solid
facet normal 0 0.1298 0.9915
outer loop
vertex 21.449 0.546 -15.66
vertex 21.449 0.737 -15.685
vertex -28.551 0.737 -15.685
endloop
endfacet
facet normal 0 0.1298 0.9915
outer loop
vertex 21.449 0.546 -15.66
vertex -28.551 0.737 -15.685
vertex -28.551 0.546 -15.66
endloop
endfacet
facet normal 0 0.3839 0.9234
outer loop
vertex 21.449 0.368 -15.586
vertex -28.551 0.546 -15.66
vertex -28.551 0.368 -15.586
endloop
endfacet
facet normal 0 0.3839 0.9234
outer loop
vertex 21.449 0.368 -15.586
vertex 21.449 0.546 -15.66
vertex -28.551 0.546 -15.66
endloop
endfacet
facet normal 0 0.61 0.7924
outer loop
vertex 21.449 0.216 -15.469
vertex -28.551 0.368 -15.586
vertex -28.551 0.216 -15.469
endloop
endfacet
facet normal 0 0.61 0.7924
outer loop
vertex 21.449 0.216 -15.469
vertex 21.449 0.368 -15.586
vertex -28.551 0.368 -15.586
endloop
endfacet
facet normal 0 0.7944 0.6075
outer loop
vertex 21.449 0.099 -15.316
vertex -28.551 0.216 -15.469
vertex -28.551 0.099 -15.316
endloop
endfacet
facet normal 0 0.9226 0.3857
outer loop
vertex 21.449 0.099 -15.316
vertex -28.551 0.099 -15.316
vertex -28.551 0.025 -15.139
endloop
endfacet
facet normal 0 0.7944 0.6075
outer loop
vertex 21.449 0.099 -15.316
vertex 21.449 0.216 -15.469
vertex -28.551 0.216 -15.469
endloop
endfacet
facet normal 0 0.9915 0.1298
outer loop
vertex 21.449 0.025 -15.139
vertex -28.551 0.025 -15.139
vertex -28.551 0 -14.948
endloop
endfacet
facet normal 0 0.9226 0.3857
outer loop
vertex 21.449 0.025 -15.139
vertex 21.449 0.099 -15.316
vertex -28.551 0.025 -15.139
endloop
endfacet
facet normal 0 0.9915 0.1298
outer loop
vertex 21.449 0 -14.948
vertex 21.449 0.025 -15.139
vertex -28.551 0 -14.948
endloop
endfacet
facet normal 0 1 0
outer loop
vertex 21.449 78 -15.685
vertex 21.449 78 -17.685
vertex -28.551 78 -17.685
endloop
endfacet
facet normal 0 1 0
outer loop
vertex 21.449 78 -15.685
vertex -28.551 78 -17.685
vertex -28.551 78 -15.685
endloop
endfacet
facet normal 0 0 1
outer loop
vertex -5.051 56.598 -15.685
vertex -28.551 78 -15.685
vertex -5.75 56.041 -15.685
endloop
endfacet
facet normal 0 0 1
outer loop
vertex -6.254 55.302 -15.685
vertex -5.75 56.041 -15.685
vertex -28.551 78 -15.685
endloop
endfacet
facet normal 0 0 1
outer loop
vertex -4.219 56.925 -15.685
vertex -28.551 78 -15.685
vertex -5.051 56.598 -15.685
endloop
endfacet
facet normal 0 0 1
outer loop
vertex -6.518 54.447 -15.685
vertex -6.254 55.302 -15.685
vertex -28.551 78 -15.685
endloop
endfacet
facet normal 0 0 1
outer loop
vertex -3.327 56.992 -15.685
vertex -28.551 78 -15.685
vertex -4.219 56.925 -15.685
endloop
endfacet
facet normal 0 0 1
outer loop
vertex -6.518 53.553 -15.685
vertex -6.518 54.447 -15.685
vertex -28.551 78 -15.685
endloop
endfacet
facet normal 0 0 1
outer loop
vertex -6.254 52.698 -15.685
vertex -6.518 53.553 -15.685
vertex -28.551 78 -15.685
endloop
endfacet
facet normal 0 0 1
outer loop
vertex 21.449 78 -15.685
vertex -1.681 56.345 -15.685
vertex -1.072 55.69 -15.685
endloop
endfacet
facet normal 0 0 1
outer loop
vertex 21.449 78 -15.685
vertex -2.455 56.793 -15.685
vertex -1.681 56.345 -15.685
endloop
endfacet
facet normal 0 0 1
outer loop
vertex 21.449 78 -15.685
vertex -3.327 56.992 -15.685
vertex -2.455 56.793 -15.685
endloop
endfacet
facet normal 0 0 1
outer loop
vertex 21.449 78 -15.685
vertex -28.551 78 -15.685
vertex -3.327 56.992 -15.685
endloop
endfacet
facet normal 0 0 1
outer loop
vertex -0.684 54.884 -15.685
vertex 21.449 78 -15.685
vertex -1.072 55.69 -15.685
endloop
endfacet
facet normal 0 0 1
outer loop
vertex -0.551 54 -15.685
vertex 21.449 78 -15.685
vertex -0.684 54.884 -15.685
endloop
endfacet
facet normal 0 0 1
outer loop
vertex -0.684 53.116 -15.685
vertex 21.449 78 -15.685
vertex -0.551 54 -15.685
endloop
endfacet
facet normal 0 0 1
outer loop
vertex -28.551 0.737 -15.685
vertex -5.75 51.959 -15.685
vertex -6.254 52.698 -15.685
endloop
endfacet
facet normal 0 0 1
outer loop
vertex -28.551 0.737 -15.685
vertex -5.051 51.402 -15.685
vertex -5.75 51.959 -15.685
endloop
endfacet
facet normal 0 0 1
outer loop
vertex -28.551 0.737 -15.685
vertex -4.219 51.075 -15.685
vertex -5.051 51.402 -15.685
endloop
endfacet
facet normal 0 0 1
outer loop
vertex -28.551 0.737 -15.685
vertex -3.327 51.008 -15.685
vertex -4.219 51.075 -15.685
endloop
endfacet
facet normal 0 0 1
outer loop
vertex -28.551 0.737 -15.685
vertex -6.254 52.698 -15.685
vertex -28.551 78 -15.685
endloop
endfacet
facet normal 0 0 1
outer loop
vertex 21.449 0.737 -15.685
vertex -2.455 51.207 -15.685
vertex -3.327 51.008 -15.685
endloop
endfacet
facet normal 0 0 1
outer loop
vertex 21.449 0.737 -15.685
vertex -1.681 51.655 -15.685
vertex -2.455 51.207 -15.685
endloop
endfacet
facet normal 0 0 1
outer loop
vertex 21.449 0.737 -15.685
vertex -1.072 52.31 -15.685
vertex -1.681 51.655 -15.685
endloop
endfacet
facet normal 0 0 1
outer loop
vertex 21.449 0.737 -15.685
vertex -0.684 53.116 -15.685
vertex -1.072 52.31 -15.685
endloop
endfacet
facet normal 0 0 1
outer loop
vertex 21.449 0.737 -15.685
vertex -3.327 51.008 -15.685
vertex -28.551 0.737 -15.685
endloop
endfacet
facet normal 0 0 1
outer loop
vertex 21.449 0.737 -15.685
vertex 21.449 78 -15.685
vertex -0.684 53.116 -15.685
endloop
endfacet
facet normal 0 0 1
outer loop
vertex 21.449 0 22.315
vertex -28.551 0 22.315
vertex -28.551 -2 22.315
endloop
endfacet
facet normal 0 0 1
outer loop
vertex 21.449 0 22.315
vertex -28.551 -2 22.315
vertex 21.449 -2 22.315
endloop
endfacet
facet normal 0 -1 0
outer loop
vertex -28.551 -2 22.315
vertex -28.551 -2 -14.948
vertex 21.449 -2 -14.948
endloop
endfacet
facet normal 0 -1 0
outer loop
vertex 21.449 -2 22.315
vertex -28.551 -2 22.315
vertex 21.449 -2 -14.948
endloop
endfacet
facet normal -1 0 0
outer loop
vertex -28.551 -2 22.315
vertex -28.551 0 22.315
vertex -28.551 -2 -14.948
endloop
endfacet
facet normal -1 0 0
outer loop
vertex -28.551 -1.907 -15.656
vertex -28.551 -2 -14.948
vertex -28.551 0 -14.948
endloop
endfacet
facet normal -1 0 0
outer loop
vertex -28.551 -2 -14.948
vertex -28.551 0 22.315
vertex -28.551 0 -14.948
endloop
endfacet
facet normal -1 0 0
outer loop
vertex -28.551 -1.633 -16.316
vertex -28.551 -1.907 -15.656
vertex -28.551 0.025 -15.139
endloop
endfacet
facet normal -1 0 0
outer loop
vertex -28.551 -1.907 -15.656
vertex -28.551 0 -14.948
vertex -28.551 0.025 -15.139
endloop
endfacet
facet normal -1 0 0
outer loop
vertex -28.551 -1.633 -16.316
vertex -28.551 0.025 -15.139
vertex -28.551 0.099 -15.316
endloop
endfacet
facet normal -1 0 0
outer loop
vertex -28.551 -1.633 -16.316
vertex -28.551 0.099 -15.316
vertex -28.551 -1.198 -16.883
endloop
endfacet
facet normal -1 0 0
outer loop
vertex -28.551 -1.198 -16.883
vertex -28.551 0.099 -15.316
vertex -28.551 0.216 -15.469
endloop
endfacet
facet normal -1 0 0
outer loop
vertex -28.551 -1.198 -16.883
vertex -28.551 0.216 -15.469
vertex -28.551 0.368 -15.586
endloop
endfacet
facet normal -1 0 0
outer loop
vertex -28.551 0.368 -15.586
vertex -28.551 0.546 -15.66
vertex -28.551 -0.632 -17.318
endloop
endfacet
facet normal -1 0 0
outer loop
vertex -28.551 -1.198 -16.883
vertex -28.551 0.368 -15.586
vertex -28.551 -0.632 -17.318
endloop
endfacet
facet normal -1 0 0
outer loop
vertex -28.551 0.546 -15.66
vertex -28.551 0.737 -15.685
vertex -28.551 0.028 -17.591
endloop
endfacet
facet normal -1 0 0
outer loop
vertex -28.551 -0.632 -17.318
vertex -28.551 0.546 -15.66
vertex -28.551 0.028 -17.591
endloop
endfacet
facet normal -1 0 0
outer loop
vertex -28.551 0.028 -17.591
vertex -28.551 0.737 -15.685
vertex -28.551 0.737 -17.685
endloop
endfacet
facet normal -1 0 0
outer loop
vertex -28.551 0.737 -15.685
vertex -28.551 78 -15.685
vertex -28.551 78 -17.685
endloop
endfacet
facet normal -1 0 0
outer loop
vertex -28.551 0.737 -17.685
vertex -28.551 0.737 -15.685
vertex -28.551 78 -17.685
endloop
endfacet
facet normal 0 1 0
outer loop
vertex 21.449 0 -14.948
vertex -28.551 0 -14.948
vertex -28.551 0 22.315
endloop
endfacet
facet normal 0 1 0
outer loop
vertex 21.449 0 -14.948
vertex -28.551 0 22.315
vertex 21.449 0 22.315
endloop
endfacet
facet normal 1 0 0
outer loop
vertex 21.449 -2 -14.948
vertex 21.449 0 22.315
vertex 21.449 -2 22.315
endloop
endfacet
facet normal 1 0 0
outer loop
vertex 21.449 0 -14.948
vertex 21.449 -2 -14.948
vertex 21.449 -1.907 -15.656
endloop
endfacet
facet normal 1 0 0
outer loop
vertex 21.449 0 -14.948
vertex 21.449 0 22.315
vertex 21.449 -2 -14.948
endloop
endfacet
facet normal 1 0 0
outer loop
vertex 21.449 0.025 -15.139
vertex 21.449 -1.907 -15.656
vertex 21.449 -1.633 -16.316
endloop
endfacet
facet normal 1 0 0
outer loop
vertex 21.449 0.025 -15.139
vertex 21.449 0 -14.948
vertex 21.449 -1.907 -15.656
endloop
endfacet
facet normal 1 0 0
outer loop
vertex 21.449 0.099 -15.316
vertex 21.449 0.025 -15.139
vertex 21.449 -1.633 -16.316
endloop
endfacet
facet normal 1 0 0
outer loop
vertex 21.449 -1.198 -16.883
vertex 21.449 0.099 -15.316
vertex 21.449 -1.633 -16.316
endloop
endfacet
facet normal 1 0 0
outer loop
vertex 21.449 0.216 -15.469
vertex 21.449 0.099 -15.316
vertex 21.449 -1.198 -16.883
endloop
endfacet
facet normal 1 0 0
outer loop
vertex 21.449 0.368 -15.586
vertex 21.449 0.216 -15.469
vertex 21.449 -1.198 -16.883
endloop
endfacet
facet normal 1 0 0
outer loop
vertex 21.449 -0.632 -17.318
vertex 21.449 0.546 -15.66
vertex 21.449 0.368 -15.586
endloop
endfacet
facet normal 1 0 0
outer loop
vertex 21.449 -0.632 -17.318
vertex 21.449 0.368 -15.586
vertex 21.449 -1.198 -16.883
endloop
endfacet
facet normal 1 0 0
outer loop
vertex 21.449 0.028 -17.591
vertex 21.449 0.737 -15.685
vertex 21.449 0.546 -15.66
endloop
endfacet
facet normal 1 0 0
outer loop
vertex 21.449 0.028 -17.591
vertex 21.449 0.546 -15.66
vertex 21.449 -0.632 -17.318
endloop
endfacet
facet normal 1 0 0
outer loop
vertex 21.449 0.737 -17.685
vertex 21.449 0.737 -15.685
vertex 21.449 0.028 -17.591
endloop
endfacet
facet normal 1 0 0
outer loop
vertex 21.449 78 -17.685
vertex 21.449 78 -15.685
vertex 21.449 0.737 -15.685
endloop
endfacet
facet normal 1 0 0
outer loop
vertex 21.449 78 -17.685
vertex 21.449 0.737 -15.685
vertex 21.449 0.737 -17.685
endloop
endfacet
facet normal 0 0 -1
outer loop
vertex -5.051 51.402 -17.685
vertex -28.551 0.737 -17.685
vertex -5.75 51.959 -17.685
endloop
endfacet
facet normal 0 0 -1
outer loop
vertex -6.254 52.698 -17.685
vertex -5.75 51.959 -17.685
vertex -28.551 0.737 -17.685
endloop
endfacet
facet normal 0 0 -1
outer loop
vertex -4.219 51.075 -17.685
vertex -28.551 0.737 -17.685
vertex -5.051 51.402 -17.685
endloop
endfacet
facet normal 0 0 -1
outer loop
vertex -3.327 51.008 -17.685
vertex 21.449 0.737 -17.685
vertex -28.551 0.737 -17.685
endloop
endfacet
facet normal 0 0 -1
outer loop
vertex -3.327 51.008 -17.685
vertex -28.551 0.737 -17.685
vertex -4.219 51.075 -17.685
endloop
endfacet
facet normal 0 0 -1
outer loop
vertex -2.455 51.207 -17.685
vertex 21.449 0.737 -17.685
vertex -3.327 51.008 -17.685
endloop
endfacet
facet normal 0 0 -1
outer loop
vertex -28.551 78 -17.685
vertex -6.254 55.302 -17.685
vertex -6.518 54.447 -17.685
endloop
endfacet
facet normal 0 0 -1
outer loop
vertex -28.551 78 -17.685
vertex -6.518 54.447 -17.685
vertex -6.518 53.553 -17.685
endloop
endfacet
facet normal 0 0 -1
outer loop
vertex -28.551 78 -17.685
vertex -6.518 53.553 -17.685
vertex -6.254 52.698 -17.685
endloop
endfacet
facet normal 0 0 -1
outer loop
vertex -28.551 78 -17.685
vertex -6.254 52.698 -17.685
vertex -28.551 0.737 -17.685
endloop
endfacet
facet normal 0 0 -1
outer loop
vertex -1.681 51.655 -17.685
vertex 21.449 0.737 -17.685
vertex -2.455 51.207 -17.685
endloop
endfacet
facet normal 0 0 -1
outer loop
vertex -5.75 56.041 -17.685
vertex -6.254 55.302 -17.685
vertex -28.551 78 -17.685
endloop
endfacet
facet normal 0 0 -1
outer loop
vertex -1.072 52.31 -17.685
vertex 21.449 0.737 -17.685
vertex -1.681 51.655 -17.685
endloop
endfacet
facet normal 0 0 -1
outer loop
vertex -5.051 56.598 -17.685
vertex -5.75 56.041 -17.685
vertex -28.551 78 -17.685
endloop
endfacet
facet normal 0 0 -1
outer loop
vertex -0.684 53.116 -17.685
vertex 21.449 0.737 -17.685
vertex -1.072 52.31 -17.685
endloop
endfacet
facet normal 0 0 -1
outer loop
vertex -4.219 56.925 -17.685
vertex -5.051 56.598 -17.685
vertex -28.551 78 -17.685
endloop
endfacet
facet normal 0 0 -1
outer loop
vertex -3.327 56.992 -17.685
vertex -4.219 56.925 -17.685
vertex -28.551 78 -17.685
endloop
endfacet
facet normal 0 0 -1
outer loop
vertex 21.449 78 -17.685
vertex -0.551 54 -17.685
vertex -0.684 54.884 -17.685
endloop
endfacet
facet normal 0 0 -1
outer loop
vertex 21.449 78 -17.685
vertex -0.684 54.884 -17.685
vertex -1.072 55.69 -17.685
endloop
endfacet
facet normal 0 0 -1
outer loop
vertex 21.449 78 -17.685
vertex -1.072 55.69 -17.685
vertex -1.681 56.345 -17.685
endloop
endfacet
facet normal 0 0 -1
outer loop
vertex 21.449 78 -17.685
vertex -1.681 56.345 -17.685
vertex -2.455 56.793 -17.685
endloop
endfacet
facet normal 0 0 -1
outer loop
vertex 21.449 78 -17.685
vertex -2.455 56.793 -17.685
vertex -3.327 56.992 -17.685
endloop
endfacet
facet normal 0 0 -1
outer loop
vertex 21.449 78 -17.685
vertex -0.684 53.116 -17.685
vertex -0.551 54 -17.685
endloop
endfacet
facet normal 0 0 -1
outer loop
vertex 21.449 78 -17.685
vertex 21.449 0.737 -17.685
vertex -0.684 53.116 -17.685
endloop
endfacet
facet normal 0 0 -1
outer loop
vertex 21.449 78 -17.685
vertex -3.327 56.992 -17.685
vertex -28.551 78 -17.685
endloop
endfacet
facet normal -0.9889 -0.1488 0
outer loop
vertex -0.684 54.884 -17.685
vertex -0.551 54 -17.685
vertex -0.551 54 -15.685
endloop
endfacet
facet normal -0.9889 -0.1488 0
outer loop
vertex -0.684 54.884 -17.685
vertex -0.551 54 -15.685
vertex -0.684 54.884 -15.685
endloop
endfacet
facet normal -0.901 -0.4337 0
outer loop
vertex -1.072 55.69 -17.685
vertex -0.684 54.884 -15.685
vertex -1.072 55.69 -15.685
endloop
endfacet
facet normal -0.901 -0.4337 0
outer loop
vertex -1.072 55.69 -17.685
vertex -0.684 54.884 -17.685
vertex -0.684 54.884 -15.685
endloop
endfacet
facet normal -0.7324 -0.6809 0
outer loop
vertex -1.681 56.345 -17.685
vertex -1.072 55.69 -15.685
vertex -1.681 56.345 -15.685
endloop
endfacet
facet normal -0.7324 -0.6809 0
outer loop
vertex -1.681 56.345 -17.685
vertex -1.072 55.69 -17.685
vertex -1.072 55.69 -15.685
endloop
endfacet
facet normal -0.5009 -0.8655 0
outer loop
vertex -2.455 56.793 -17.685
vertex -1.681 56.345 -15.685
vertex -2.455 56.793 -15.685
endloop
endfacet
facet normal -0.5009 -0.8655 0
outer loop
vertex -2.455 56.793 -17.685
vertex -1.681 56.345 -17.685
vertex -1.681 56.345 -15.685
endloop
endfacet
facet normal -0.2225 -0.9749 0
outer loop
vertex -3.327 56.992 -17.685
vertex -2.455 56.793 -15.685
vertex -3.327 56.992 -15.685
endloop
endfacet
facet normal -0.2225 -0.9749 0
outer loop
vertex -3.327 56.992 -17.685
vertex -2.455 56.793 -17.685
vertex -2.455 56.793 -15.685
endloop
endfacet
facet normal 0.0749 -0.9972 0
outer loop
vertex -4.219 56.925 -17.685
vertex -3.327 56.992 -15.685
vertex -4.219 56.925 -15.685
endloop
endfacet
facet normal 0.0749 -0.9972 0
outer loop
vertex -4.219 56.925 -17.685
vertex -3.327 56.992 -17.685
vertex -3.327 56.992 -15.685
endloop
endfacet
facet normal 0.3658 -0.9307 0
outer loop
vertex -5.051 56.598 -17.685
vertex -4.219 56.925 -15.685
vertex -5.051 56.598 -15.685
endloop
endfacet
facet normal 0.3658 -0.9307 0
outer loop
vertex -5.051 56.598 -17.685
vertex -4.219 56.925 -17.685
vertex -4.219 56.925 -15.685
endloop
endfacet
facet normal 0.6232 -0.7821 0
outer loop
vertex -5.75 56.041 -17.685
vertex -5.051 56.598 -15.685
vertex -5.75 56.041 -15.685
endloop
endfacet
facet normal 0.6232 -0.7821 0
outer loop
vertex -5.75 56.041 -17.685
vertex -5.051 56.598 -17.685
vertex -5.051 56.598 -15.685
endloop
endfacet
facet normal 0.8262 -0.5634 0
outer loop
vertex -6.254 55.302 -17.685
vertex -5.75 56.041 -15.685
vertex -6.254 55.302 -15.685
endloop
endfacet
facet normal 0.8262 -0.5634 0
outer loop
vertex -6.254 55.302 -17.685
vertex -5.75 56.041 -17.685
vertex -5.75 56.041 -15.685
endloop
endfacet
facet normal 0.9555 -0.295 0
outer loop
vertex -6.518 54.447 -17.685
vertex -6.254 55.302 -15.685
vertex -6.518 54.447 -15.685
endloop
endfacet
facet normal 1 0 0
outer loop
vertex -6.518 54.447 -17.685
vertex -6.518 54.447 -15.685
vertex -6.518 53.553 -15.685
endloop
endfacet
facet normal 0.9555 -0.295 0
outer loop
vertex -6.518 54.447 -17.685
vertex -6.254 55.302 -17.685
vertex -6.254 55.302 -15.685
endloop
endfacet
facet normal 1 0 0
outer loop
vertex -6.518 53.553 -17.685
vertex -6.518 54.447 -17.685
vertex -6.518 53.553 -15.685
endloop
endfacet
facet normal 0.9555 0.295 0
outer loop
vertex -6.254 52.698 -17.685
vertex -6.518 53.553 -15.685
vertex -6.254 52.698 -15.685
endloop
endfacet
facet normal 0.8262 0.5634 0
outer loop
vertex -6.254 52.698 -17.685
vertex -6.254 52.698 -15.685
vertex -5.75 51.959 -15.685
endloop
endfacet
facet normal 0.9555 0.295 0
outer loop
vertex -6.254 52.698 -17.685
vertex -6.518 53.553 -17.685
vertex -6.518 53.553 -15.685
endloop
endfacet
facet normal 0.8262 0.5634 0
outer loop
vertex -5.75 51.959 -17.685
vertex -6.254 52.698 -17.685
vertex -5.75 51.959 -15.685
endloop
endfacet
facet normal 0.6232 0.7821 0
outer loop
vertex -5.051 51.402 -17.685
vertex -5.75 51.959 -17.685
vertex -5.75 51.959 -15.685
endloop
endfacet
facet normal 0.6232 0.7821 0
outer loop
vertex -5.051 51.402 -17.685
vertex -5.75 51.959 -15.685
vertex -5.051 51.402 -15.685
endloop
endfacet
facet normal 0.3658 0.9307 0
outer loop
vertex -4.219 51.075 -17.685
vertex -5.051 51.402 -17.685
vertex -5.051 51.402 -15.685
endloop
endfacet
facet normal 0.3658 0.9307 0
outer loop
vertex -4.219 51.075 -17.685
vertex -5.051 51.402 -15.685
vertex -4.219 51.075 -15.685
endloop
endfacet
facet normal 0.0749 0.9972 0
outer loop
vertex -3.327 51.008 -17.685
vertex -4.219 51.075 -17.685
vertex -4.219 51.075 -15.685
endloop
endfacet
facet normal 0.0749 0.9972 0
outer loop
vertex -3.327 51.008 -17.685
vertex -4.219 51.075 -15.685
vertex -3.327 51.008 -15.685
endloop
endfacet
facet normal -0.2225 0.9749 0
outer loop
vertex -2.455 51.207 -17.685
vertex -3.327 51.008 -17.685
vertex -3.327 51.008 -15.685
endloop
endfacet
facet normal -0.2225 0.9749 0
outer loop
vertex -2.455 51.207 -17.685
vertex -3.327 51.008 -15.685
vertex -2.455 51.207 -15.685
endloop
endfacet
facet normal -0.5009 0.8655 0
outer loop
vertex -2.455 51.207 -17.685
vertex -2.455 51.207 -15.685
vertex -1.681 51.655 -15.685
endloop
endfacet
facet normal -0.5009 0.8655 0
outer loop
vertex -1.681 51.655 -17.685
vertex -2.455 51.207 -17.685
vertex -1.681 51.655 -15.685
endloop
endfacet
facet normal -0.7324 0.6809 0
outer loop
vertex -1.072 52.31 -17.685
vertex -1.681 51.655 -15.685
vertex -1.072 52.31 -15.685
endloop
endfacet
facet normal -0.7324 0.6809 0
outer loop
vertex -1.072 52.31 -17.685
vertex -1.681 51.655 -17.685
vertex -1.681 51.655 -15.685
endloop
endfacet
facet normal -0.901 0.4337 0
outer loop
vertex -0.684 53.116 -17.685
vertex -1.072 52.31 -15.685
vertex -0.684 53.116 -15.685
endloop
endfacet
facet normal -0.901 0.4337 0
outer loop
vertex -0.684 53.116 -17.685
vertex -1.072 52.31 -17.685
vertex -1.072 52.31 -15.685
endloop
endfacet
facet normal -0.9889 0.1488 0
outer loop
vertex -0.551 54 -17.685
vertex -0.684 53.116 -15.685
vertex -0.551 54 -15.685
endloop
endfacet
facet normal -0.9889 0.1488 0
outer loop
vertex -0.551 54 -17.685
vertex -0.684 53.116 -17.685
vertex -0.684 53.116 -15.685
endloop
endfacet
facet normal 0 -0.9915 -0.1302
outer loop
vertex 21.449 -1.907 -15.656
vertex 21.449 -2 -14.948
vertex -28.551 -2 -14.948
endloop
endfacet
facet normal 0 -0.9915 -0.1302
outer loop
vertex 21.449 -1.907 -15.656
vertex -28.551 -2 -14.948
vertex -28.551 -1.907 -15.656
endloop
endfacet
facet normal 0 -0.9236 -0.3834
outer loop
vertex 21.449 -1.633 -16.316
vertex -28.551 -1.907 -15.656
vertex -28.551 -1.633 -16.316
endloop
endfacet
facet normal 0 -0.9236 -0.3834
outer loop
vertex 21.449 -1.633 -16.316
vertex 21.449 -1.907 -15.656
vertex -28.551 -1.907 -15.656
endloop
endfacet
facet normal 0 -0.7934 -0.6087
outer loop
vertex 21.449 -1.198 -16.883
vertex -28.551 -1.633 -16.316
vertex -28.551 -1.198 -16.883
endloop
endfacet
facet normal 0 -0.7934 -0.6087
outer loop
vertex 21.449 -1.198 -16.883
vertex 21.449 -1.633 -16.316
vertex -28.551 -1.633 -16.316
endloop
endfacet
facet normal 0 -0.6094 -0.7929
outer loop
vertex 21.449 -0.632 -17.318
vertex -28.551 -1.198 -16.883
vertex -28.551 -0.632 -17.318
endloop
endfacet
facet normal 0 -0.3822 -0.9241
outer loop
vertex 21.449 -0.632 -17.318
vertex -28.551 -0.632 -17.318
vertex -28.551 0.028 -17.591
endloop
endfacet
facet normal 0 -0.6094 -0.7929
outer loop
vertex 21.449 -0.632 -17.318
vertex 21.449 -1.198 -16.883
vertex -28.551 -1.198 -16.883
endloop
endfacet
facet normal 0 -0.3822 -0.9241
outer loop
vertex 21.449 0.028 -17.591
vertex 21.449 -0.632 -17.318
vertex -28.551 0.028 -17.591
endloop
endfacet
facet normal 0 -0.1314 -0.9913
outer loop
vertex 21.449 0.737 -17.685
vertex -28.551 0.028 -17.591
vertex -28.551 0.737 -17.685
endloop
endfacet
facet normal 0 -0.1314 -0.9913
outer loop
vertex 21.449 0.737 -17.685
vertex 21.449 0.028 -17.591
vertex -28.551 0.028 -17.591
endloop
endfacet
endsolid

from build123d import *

# Parameters (mm, degrees)
SKETCH1_W                    = 50
SKETCH1_H                    = 40
BASE_FLANGE1_DEPTH           = 2
EDGE_FLANGE1_STRIP_W         = 9.4732
EDGE_FLANGE1_STRIP_H         = 2
EDGE_FLANGE1_STRIP_CUT_DEPTH = 50
EDGE_FLANGE1_DEPTH           = 50
ADVANCEDHOLE2_START          = -17.684659091
ADVANCEDHOLE2_OUTLINE_R      = 3
ADVANCEDHOLE2_DEPTH          = 2


# Read off the part's stored shape, not the designer's step: AdvancedHole2
# Sheet-metal steps are written as plain solids
with BuildPart() as part:
    # Sketch1 → Base-Flange1 (new body)
    with BuildSketch(Plane(origin=(0, 0, 0), x_dir=(1, 0, 0), z_dir=(0, 1, 0))):
        with Locations((-3.551136364, -2.315340909)):
            Rectangle(SKETCH1_W, SKETCH1_H)
    extrude(amount=-BASE_FLANGE1_DEPTH)

    # Edge-Flange1 strip (across the edge) → Edge-Flange1 strip cut (cut)
    with BuildSketch(Plane(origin=(21.448863636, 0, -17.684659091), x_dir=(0, 0, 1), z_dir=(-1, 0, 0))):
        with Locations((-2, -1)):
            Rectangle(EDGE_FLANGE1_STRIP_W, EDGE_FLANGE1_STRIP_H)
    extrude(amount=EDGE_FLANGE1_STRIP_CUT_DEPTH, mode=Mode.SUBTRACT)

    # Edge-Flange1 section (across the edge) → Edge-Flange1 (add)
    with BuildSketch(Plane(origin=(21.448863636, 0, -17.684659091), x_dir=(0, 0, 1), z_dir=(-1, 0, 0))):
        with BuildLine():
            Line((0, 0.7366), (0, 78))
            Line((0, 78), (2, 78))
            Line((2, 78), (2, 0.7366))
            ThreePointArc((2, 0.7366), (2.215745145, 0.215745145), (2.7366, 0))
            Line((2.7366, 0), (2.7366, -2))
            ThreePointArc((2.7366, -2), (0.801531583, -1.198468417), (0, 0.7366))
        make_face()
    extrude(amount=EDGE_FLANGE1_DEPTH)

    # AdvancedHole2 outline → AdvancedHole2 (cut)
    with BuildSketch(Plane.XY.offset(ADVANCEDHOLE2_START)):
        with Locations((-3.551136364, 54)):
            Circle(ADVANCEDHOLE2_OUTLINE_R)
    extrude(amount=ADVANCEDHOLE2_DEPTH, mode=Mode.SUBTRACT)


solid = part.part
